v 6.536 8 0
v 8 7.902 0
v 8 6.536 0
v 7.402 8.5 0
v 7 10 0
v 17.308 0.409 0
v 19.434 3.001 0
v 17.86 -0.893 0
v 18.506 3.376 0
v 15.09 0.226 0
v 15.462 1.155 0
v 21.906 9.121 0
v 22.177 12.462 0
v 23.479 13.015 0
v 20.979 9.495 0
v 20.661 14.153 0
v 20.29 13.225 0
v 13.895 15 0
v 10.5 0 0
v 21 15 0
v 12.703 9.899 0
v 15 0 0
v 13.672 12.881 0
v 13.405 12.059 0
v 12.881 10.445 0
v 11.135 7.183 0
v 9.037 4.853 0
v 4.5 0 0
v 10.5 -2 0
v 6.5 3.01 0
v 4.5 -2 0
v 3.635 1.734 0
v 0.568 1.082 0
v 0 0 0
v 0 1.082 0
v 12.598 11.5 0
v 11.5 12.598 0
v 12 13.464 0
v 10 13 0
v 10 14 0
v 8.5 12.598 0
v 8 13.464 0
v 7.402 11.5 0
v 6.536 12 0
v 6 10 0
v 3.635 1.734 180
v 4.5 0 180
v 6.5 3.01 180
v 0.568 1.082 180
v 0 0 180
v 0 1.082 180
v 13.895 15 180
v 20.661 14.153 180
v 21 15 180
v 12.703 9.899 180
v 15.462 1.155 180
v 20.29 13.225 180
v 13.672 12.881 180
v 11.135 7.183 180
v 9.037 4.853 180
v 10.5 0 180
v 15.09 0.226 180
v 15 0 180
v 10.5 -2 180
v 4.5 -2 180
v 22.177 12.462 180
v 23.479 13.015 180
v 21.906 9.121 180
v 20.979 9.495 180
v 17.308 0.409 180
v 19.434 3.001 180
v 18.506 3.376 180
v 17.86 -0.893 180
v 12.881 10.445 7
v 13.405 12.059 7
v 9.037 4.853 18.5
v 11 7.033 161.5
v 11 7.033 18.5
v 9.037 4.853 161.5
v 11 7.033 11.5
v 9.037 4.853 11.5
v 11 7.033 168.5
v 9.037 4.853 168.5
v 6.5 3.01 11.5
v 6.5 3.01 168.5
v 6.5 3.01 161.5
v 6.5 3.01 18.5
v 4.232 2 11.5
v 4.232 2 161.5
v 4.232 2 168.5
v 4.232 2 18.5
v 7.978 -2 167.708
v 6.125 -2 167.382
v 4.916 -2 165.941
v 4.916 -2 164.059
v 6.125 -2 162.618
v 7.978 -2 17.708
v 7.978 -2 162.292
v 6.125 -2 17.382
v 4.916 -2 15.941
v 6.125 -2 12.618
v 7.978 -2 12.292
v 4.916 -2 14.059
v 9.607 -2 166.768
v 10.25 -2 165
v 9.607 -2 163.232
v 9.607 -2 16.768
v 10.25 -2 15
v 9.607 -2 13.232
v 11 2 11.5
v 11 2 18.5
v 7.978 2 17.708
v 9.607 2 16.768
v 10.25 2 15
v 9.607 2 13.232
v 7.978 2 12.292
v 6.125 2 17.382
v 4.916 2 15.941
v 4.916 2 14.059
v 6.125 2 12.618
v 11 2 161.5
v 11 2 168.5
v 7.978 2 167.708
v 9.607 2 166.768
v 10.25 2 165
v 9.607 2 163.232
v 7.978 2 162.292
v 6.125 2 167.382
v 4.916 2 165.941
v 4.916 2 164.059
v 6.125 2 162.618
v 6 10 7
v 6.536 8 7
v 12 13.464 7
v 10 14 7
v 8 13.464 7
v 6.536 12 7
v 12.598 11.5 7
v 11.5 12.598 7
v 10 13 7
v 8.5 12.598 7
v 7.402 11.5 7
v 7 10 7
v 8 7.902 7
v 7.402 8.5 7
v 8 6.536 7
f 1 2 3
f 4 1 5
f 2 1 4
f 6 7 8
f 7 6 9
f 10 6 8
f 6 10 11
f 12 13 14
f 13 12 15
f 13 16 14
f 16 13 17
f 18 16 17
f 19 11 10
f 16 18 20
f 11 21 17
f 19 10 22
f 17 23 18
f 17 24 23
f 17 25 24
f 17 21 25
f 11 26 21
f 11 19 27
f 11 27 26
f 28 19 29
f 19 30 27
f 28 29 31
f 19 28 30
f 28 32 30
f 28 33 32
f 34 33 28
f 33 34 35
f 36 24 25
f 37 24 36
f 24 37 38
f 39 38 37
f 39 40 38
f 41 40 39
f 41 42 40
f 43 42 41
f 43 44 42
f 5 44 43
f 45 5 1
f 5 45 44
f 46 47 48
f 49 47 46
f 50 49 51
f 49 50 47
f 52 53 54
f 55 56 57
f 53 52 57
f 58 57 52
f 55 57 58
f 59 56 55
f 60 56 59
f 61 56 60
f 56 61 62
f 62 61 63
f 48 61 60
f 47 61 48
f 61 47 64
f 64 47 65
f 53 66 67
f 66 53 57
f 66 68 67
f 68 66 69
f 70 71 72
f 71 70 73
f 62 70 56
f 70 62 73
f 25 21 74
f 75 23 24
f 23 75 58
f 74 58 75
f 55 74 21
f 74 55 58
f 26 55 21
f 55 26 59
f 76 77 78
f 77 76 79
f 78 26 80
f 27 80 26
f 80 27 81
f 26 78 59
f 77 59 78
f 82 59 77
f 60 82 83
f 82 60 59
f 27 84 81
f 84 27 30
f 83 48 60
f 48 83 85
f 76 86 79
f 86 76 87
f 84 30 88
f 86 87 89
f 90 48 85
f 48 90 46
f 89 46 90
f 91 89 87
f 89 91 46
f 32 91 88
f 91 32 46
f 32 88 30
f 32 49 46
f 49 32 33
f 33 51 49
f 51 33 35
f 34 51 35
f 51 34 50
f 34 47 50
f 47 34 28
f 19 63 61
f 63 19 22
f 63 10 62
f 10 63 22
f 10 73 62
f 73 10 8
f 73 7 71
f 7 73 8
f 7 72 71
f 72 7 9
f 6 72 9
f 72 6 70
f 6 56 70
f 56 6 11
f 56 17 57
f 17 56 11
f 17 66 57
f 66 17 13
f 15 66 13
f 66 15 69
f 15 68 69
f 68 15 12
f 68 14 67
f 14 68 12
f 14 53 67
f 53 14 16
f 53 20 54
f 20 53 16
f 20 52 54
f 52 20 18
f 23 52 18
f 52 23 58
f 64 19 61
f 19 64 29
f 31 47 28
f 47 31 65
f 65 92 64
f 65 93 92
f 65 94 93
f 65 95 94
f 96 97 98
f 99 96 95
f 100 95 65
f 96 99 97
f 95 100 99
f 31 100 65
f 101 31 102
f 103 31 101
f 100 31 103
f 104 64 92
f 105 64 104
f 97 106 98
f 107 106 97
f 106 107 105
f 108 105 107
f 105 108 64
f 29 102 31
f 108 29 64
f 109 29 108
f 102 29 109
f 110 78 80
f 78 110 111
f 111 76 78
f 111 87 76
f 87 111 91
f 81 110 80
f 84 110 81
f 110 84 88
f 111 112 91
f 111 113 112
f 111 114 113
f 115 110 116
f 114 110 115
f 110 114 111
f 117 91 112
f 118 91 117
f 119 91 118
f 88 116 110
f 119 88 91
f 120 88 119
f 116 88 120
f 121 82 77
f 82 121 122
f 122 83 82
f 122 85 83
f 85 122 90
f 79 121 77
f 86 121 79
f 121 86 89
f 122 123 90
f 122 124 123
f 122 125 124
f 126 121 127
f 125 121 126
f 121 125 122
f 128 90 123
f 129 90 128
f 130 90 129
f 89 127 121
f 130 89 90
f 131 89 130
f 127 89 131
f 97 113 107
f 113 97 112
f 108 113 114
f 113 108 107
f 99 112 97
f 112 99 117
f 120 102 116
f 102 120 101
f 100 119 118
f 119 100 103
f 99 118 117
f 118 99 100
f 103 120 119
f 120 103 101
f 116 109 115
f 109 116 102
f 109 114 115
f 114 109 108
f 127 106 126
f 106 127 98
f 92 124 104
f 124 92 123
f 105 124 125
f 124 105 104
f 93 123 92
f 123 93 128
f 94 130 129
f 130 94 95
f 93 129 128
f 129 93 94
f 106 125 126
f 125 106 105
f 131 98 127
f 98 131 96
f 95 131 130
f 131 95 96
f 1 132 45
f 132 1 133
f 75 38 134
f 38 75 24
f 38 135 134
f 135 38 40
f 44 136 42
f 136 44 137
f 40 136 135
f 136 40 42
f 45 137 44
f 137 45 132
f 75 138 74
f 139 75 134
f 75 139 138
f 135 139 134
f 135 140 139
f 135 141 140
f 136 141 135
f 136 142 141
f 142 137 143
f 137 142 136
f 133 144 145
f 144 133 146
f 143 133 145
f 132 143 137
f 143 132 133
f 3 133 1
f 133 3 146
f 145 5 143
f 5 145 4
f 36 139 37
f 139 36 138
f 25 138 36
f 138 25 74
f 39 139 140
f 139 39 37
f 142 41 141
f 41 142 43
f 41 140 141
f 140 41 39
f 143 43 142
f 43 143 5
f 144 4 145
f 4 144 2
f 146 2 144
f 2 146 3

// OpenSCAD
// LED Bar for Alfawise U30 printer

bar_length=180; // Minimum=40 !
hole_size=5.5; // [3, 3.5, 4, 4.5, 5, 5.5]
use_wire_clip=true;


difference() {
    union() {
        // Main support for the LED bar
        linear_extrude(height=bar_length) {
            difference() {
                square(15);
                translate([-1, 16, 0]) circle(r=15);
            }

            // Triangle to spin the led toward the hotend
            translate([15, 0, 0]) polygon(points=[[0,0],[6,15],[0,15]]);

            translate([0.8, 6, 0]) rotate([0, 0, -22]) {
                // Left notch to fix the LED strip
                translate([15, 0, 0]) square([3.4, 1]);
                translate([17.4, 1, 0]) square([1, 3.2]);

                // Right notch to fix the LED strip
                translate([15, 14, 0]) square([3.4, 1]);
                translate([17.4, 10.8, 0]) square([1, 3.2]);
            }
        }

        // Small bar to align the support to the rail
        translate([4.5,-2,0]) cube(size=[6,2,bar_length]);
    }

// Blocks to fix the screws
    translate([4,2,11.5]) cube([7,6,7]);
    translate([4,2,bar_length-18.5]) cube([7,6,7]);

    // Holes to fix the bar to the aluminum profile
    translate([7.5,10,15]) rotate([90,0,0]) cylinder(15, d=hole_size);
    translate([7.5,10,bar_length-15]) rotate([90,0,0]) cylinder(15, d=hole_size);
}

if (use_wire_clip) {
    // Wire clip
    translate([10, 10, 0]) difference() {
        // Ring 
        difference() {
            cylinder(7, d=8, $fn=12);
            cylinder(7, d=6, $fn=12);
        }

        // Hole to do an open ring
        translate([-2,-7,-1]) cube([4,6,9]);
    }
}
